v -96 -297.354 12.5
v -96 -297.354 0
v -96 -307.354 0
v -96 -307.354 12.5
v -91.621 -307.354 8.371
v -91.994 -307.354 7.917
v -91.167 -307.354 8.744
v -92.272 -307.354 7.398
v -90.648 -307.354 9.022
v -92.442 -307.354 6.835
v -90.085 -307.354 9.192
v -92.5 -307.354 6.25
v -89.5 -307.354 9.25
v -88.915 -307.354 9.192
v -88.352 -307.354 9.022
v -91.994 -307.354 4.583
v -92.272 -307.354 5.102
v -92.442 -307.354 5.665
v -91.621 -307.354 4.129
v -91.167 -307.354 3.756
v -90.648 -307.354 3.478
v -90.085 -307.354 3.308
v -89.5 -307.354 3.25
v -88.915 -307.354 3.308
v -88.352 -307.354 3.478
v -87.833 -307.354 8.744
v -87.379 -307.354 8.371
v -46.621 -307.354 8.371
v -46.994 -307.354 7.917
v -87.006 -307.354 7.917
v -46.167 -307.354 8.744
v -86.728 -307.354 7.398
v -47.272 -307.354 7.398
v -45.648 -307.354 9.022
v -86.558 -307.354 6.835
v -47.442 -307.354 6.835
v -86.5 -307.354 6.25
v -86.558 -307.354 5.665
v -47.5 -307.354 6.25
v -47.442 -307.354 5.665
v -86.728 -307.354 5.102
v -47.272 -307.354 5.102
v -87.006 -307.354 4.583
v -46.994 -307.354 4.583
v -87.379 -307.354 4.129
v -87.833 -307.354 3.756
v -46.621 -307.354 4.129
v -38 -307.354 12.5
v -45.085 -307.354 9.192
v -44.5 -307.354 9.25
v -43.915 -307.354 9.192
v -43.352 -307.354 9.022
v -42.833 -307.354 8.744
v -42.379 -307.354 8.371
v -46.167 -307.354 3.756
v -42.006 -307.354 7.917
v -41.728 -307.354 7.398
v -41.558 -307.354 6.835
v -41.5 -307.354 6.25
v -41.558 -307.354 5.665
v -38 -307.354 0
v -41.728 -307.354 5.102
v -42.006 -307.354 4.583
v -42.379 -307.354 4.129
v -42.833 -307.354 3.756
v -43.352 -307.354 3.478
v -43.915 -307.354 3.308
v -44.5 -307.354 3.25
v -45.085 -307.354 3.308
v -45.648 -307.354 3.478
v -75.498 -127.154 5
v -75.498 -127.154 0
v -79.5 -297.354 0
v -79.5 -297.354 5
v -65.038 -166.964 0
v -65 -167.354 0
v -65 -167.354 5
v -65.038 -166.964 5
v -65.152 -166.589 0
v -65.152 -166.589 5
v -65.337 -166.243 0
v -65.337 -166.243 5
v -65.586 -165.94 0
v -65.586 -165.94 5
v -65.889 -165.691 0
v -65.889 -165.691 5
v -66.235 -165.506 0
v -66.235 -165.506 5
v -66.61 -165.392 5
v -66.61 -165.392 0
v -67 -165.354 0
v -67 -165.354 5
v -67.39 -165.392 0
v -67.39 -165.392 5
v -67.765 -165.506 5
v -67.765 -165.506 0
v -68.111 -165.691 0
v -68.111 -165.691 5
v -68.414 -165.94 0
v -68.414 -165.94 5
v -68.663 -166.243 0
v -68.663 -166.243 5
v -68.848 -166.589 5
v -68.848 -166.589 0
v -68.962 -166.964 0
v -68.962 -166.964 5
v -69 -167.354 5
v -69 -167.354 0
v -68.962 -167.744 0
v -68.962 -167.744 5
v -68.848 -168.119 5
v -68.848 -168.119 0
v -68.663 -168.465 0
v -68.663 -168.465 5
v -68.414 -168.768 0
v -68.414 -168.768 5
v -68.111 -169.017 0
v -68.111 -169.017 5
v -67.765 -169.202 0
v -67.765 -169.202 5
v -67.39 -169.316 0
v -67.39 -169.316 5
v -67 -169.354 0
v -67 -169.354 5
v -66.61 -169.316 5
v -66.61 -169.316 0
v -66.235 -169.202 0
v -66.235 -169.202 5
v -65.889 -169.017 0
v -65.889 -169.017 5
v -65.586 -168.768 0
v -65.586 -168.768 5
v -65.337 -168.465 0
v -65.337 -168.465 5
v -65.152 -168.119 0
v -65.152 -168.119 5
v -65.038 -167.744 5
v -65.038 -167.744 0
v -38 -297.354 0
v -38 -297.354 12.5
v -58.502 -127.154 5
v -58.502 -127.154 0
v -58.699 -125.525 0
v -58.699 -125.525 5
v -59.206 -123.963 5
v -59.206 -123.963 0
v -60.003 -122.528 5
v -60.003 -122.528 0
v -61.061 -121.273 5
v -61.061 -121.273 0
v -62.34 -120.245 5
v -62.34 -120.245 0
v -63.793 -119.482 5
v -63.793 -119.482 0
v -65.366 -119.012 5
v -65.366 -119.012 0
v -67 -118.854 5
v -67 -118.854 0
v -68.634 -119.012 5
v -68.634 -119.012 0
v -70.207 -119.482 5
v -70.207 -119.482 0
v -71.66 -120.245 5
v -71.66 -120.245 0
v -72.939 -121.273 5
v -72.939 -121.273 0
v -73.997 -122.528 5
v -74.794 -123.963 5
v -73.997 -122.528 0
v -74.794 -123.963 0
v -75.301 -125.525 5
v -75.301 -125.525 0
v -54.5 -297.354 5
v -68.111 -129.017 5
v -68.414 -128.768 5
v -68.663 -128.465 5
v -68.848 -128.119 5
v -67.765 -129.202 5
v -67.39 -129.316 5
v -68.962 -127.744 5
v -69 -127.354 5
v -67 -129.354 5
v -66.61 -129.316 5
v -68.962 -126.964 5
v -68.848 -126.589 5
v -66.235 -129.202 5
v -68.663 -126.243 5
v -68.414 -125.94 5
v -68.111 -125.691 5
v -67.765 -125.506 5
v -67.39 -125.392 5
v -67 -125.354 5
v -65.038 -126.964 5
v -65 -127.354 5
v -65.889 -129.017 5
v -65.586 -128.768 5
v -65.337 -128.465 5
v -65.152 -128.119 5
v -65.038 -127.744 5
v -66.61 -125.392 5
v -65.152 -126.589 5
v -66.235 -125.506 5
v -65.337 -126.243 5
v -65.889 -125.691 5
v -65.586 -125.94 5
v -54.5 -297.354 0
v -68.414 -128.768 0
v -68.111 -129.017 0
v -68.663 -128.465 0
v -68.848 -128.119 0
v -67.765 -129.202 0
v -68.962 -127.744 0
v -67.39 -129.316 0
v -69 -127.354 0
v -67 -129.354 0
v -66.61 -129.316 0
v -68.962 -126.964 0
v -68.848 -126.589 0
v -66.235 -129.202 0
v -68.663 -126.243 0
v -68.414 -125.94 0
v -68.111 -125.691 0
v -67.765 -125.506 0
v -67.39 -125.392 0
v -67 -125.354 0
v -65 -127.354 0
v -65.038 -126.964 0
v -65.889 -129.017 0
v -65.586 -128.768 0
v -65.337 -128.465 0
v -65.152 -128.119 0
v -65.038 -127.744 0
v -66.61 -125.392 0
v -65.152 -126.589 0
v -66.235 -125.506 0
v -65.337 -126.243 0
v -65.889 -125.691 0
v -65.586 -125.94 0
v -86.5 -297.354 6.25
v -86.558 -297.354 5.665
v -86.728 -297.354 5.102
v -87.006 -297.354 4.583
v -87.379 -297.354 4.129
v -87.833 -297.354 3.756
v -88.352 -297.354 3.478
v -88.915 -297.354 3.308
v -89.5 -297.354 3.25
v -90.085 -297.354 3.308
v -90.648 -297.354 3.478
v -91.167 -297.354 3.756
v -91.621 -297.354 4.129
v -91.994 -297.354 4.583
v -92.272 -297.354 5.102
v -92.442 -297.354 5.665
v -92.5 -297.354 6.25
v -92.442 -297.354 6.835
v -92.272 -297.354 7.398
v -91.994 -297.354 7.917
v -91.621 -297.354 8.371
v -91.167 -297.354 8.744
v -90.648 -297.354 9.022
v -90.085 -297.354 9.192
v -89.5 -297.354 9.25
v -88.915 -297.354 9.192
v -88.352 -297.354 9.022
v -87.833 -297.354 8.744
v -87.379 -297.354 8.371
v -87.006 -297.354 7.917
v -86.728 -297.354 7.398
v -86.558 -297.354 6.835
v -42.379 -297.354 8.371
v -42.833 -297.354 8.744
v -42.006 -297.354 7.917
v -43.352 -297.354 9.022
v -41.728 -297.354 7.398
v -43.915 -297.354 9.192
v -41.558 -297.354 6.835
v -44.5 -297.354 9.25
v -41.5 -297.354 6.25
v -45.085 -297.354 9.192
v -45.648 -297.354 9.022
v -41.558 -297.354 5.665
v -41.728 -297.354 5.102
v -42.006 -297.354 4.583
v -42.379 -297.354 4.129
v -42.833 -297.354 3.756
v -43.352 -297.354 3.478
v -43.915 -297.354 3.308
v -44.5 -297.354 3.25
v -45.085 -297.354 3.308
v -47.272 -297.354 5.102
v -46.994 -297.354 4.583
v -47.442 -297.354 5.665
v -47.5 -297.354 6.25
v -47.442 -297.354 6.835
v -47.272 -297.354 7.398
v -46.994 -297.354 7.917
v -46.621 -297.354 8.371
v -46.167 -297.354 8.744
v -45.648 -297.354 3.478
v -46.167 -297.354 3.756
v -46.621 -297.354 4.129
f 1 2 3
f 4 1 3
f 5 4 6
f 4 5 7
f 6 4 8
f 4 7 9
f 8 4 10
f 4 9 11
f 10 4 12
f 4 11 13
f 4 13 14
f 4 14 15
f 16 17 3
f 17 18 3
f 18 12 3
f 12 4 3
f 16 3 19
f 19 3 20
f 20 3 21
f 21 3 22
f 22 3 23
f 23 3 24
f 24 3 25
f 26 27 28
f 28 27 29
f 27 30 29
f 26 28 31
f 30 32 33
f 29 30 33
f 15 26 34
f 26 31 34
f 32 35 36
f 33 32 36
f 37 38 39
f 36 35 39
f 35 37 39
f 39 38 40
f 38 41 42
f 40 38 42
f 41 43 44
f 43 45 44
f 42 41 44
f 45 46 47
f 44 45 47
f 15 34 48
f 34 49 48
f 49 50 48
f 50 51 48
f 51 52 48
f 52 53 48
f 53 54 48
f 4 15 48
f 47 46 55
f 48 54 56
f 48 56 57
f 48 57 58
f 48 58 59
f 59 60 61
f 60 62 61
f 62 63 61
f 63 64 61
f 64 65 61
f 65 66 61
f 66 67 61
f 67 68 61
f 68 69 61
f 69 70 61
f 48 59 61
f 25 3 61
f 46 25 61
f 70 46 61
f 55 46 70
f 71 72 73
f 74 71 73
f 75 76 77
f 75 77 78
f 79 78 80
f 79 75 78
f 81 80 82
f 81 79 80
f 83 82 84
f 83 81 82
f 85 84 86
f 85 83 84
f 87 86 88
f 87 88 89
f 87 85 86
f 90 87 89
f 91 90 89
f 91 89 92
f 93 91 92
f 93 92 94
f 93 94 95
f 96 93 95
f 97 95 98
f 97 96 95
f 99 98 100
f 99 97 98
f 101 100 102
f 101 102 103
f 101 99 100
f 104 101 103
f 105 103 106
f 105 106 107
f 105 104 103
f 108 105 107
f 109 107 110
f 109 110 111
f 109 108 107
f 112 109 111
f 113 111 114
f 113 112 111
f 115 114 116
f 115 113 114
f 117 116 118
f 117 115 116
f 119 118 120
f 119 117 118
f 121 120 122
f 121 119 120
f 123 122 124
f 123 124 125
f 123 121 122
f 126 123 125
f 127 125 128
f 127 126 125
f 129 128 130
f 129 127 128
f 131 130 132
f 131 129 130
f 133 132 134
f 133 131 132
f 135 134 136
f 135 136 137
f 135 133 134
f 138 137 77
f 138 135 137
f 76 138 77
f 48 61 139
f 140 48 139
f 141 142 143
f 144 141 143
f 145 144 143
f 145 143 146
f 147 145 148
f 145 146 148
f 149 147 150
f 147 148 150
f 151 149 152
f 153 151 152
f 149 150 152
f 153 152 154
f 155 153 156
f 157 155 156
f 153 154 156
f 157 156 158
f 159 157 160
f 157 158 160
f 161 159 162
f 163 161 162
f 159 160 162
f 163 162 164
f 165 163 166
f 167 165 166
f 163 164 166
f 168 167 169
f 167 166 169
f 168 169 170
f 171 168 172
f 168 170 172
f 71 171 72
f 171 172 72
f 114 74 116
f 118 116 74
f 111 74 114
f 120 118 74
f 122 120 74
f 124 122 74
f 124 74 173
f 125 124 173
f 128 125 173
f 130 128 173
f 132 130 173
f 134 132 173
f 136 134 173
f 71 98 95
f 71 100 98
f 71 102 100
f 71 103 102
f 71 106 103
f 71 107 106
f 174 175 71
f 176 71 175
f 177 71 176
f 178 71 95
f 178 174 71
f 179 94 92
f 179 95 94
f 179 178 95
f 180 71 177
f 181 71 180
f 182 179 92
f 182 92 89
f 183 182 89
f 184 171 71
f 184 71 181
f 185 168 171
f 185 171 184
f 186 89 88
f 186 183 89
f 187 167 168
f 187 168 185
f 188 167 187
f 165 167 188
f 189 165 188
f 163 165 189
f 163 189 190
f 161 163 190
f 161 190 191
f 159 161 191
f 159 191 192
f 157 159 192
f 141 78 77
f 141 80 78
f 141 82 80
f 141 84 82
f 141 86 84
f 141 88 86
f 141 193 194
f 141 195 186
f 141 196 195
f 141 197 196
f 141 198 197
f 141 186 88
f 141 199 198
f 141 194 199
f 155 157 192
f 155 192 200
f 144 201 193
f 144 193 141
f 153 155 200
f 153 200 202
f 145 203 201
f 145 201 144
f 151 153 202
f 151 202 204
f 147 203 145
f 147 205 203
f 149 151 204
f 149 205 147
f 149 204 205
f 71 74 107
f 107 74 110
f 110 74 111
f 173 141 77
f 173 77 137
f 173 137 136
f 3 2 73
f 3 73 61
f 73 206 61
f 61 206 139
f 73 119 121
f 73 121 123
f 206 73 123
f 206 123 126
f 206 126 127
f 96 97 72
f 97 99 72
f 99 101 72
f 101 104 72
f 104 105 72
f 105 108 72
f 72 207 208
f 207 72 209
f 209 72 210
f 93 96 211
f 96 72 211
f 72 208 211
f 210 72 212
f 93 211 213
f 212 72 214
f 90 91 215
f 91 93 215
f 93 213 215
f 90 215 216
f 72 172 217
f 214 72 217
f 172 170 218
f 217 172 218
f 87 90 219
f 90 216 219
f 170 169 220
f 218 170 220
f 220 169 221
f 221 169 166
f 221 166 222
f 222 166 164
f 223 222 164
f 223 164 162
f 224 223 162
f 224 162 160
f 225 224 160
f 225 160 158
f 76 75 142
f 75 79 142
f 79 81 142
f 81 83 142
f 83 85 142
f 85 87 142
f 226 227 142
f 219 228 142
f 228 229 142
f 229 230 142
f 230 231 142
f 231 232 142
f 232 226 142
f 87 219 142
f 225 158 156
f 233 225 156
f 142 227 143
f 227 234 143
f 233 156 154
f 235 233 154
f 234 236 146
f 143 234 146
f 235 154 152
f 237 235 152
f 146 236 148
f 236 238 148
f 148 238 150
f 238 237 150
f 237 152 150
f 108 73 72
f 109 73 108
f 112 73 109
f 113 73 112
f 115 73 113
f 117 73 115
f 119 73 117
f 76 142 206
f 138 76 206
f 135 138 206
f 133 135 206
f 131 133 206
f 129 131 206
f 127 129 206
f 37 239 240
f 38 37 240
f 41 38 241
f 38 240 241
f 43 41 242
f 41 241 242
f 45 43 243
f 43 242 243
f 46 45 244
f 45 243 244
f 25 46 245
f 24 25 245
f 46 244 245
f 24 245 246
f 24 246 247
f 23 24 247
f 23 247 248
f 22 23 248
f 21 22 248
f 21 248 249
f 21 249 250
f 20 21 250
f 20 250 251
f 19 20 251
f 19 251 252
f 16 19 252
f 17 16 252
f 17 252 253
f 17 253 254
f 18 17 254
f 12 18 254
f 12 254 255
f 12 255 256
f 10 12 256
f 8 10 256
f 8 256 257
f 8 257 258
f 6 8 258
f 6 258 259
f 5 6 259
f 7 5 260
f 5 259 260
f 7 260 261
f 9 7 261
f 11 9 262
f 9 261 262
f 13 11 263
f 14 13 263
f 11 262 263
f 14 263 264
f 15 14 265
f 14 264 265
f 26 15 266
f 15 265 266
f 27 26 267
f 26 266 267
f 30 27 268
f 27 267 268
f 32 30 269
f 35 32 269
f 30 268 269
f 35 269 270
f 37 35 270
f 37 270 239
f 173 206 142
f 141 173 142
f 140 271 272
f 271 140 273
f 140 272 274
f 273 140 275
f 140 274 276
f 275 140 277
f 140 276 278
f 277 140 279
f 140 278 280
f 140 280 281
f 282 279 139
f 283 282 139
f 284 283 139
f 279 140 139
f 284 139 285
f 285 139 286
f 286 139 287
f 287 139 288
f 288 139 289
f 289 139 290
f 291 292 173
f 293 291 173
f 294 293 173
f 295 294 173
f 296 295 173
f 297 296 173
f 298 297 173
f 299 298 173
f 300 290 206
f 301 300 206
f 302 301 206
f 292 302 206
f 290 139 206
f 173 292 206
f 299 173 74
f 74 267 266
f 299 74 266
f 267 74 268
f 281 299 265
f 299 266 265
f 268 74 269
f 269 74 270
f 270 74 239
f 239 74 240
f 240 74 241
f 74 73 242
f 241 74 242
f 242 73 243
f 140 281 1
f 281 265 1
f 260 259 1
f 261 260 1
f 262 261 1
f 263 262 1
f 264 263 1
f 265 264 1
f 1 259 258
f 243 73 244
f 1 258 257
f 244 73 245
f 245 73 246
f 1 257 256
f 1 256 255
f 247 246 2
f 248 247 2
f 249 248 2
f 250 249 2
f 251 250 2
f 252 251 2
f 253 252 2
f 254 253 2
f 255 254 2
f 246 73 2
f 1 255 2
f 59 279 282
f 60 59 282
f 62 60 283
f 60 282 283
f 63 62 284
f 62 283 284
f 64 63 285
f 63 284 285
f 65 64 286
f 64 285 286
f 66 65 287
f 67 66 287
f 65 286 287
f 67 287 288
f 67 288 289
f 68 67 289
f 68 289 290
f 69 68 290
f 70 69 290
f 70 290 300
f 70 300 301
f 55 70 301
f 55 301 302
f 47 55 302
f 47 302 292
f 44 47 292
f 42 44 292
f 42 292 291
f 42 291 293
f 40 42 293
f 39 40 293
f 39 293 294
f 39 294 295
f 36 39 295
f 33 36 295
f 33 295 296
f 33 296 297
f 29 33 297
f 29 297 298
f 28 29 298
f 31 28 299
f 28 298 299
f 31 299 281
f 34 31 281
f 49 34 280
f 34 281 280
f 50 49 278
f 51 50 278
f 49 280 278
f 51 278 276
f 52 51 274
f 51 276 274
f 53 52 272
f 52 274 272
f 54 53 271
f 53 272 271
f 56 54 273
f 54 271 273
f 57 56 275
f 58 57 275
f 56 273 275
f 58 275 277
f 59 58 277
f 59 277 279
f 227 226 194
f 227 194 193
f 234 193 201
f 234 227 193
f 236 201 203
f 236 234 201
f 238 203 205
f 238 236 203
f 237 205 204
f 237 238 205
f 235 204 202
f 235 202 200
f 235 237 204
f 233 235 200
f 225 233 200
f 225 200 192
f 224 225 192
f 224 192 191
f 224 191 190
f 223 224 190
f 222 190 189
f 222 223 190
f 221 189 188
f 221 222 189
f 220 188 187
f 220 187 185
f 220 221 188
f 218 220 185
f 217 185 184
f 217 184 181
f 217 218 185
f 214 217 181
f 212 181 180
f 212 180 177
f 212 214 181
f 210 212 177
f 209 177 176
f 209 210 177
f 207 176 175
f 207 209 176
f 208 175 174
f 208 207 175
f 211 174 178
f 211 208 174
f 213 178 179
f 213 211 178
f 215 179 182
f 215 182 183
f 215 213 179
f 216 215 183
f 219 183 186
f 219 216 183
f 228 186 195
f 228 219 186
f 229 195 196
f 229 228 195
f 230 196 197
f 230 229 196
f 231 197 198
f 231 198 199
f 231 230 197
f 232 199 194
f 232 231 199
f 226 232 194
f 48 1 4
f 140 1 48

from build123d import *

# Parameters (mm, degrees)
SKETCH1_R           = 2
BOSS_EXTRUDE1_DEPTH = 5
SKETCH2_W           = 58
SKETCH2_H           = 10
BOSS_EXTRUDE2_DEPTH = 10
SKETCH3_R           = 3
CUT_EXTRUDE1_DEPTH  = 11


with BuildPart() as part:
    # Sketch1 → Boss-Extrude1 (new body)
    with BuildSketch(Plane.XY):
        with BuildLine():
            Line((-75.497650797, -127.154118822), (-79.5, -297.353946086))
            Line((-79.5, -297.353946086), (-96, -297.353946086))
            Line((-96, -297.353946086), (-96, -307.353946086))
            Line((-96, -307.353946086), (-38, -307.353946086))
            Line((-38, -307.353946086), (-38, -297.353946086))
            Line((-38, -297.353946086), (-54.5, -297.353946086))
            Line((-54.5, -297.353946086), (-58.502349203, -127.154118822))
            ThreePointArc((-58.502349203, -127.154118822), (-67, -118.853946086), (-75.497650797, -127.154118822))
        make_face()
        with Locations((-67, -167.353946086)):
            Circle(SKETCH1_R, mode=Mode.SUBTRACT)
        with Locations((-67, -127.353946086)):
            Circle(SKETCH1_R, mode=Mode.SUBTRACT)
    extrude(amount=BOSS_EXTRUDE1_DEPTH)

    # Sketch2 → Boss-Extrude2 (add)
    with BuildSketch(Plane.XY.offset(2.5)):
        with Locations((-67, -302.353946086)):
            Rectangle(SKETCH2_W, SKETCH2_H)
    extrude(amount=BOSS_EXTRUDE2_DEPTH)

    # Sketch3 → Cut-Extrude1 (cut, through all)
    with BuildSketch(Plane(origin=(0, -297.353946086, 0), x_dir=(1, 0, 0), z_dir=(0, 1, 0))):
        with Locations((-89.5, -6.25)):
            Circle(SKETCH3_R)
        with Locations((-44.5, -6.25)):
            Circle(SKETCH3_R)
    extrude(amount=-CUT_EXTRUDE1_DEPTH, mode=Mode.SUBTRACT)


solid = part.part
